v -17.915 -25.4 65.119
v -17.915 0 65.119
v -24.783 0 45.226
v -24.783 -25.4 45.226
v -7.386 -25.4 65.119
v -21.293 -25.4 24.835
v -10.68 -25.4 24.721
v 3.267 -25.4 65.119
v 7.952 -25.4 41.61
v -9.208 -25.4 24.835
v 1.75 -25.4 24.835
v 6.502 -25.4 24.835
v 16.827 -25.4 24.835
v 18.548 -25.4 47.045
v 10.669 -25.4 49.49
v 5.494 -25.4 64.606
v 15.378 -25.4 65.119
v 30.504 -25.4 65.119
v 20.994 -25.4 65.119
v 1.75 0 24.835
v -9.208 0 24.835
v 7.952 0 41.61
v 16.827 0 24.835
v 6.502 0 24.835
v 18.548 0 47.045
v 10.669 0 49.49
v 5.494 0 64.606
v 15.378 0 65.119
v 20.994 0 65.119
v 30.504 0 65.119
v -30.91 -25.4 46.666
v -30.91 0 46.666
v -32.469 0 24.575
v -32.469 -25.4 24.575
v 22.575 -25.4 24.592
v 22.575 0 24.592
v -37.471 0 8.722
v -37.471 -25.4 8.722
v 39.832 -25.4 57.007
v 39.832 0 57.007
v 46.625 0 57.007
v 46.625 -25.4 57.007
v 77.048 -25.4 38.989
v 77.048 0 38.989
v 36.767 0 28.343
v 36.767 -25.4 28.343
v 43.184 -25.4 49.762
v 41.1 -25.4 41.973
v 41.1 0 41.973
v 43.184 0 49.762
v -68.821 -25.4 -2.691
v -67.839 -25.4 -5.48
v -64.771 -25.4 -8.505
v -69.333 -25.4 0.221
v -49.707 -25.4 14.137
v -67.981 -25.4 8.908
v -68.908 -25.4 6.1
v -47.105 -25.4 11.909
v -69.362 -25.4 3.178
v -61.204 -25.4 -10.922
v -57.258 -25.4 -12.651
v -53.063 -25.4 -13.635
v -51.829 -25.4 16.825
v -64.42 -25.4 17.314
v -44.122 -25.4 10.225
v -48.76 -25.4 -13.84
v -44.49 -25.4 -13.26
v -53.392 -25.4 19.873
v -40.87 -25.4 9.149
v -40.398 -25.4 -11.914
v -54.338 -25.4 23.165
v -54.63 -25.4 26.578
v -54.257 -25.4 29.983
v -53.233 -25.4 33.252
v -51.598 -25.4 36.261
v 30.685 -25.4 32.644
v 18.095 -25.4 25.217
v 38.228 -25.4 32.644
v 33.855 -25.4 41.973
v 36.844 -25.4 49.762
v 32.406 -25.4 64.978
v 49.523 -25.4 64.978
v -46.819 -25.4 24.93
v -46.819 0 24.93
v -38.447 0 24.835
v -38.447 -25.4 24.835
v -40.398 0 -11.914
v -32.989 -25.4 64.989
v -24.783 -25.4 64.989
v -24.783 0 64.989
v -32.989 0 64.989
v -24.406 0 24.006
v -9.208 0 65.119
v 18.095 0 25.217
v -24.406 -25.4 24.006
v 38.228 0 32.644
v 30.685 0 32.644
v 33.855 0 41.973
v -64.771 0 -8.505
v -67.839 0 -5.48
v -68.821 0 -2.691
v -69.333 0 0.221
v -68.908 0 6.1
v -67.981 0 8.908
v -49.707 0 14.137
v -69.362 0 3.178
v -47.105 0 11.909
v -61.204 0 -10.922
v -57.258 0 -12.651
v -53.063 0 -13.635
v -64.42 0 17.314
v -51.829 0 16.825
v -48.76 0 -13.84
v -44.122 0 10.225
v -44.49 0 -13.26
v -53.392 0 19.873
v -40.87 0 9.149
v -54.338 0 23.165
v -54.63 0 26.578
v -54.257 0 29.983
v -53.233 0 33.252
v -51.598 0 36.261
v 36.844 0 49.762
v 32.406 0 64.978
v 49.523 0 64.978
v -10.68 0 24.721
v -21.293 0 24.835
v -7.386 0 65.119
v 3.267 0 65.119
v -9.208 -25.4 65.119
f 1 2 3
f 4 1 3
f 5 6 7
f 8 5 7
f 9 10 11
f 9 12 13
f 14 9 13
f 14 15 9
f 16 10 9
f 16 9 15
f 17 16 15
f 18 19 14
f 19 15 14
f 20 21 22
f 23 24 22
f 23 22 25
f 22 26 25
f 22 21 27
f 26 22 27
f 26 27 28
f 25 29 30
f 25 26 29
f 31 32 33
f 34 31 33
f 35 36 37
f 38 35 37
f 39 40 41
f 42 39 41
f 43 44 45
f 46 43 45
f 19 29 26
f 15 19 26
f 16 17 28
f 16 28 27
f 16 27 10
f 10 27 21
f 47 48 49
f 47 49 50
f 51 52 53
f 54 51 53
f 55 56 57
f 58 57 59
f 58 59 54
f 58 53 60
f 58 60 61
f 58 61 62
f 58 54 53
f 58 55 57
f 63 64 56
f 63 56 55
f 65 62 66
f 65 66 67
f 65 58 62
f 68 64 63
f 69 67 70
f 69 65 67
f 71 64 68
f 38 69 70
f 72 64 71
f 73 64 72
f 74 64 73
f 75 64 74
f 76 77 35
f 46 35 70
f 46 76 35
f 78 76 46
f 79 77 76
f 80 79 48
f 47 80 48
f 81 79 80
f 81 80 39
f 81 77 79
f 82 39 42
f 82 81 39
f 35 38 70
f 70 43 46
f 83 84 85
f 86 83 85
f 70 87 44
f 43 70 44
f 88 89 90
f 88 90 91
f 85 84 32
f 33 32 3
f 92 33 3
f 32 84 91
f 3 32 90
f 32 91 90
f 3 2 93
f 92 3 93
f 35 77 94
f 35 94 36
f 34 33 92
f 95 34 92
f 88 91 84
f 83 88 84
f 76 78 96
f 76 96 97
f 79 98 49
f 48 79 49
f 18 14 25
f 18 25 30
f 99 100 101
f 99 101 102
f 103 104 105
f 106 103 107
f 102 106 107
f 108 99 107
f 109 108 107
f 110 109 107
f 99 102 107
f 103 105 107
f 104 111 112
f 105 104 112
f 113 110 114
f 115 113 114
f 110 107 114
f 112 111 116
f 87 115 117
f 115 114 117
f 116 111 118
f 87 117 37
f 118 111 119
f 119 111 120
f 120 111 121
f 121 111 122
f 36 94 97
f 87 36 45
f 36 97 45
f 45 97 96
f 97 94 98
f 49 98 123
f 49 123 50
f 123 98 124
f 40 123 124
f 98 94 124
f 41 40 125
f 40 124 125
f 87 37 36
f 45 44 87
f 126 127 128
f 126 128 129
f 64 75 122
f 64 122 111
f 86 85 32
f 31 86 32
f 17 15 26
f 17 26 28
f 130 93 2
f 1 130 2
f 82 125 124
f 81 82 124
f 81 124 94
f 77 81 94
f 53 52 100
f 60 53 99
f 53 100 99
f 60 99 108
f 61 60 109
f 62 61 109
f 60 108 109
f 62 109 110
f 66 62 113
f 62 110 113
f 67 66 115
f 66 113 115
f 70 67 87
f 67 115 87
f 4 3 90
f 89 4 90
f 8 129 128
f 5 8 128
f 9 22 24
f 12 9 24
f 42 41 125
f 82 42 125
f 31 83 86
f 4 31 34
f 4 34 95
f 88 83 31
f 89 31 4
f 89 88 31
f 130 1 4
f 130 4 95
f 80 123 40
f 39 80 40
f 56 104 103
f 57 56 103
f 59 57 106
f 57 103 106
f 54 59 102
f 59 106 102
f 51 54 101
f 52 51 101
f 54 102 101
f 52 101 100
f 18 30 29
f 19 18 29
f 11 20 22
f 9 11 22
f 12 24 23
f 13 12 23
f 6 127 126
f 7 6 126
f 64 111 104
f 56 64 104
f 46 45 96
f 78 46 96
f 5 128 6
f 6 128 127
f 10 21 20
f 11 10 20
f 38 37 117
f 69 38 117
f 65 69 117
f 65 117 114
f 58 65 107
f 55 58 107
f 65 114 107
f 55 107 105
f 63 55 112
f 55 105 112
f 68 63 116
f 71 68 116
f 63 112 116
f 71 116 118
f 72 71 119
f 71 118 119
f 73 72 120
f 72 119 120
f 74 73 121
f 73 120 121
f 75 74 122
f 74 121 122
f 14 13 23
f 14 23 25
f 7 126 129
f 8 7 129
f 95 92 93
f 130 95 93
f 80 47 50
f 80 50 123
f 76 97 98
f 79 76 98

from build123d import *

# Parameters (mm, degrees)
F1_DEPTH = 25.4


with BuildPart() as f1:
    # F0 (on Front) → F1 (new body)
    with BuildSketch(Plane.XZ):
        Polygon((-46.818859, 24.929805), (-38.446698, 24.834873), (-30.909639, 46.666358), (-32.46903, 24.574976), (-24.406482, 24.005855), (-9.208106, 65.119155), (-17.914709, 65.119155), (-24.782718, 45.22561), (-24.782718, 64.989209), (-32.988828, 64.989209), align=None)
        Polygon((-7.385723, 65.119155), (-21.293391, 24.834873), (-10.680018, 24.720814), (3.267027, 65.119155), align=None)
        Polygon((5.494137, 64.60608), (-9.208106, 24.834873), (1.750091, 24.834873), (7.951523, 41.610438), (6.502392, 24.834873), (16.827447, 24.834873), (18.548289, 47.044676), (30.503614, 65.119155), (20.993697, 65.119155), (10.668642, 49.490087), (15.378317, 65.119155), align=None)
        Polygon((22.575105, 24.591815), (36.766838, 28.342584), (38.228463, 32.64394), (30.684758, 32.64394), (33.85473, 41.972719), (41.100383, 41.972719), (43.183509, 49.761795), (36.843564, 49.761795), (39.832395, 57.007447), (46.625193, 57.007447), (49.523454, 64.977668), (32.4056, 64.977668), (18.095437, 25.217149), align=None)
        with BuildLine():
            Line((-40.397573, -11.914296), (77.047856, 38.988556))
            Line((77.047856, 38.988556), (36.766838, 28.342584))
            Line((36.766838, 28.342584), (22.575105, 24.591815))
            Line((22.575105, 24.591815), (-37.471491, 8.721948))
            ThreePointArc((-37.471491, 8.721948), (-52.68486, 18.311033), (-51.597945, 36.261402))
            Line((-51.597945, 36.261402), (-64.41962, 17.313818))
            Line((-64.41962, 17.313818), (-67.981198, 8.908497))
            ThreePointArc((-67.981198, 8.908497), (-69.408435, 1.699277), (-67.838736, -5.480271))
            ThreePointArc((-67.838736, -5.480271), (-55.182961, -13.23869), (-40.397573, -11.914296))
        make_face()
    extrude(amount=F1_DEPTH)


solid = f1.part
